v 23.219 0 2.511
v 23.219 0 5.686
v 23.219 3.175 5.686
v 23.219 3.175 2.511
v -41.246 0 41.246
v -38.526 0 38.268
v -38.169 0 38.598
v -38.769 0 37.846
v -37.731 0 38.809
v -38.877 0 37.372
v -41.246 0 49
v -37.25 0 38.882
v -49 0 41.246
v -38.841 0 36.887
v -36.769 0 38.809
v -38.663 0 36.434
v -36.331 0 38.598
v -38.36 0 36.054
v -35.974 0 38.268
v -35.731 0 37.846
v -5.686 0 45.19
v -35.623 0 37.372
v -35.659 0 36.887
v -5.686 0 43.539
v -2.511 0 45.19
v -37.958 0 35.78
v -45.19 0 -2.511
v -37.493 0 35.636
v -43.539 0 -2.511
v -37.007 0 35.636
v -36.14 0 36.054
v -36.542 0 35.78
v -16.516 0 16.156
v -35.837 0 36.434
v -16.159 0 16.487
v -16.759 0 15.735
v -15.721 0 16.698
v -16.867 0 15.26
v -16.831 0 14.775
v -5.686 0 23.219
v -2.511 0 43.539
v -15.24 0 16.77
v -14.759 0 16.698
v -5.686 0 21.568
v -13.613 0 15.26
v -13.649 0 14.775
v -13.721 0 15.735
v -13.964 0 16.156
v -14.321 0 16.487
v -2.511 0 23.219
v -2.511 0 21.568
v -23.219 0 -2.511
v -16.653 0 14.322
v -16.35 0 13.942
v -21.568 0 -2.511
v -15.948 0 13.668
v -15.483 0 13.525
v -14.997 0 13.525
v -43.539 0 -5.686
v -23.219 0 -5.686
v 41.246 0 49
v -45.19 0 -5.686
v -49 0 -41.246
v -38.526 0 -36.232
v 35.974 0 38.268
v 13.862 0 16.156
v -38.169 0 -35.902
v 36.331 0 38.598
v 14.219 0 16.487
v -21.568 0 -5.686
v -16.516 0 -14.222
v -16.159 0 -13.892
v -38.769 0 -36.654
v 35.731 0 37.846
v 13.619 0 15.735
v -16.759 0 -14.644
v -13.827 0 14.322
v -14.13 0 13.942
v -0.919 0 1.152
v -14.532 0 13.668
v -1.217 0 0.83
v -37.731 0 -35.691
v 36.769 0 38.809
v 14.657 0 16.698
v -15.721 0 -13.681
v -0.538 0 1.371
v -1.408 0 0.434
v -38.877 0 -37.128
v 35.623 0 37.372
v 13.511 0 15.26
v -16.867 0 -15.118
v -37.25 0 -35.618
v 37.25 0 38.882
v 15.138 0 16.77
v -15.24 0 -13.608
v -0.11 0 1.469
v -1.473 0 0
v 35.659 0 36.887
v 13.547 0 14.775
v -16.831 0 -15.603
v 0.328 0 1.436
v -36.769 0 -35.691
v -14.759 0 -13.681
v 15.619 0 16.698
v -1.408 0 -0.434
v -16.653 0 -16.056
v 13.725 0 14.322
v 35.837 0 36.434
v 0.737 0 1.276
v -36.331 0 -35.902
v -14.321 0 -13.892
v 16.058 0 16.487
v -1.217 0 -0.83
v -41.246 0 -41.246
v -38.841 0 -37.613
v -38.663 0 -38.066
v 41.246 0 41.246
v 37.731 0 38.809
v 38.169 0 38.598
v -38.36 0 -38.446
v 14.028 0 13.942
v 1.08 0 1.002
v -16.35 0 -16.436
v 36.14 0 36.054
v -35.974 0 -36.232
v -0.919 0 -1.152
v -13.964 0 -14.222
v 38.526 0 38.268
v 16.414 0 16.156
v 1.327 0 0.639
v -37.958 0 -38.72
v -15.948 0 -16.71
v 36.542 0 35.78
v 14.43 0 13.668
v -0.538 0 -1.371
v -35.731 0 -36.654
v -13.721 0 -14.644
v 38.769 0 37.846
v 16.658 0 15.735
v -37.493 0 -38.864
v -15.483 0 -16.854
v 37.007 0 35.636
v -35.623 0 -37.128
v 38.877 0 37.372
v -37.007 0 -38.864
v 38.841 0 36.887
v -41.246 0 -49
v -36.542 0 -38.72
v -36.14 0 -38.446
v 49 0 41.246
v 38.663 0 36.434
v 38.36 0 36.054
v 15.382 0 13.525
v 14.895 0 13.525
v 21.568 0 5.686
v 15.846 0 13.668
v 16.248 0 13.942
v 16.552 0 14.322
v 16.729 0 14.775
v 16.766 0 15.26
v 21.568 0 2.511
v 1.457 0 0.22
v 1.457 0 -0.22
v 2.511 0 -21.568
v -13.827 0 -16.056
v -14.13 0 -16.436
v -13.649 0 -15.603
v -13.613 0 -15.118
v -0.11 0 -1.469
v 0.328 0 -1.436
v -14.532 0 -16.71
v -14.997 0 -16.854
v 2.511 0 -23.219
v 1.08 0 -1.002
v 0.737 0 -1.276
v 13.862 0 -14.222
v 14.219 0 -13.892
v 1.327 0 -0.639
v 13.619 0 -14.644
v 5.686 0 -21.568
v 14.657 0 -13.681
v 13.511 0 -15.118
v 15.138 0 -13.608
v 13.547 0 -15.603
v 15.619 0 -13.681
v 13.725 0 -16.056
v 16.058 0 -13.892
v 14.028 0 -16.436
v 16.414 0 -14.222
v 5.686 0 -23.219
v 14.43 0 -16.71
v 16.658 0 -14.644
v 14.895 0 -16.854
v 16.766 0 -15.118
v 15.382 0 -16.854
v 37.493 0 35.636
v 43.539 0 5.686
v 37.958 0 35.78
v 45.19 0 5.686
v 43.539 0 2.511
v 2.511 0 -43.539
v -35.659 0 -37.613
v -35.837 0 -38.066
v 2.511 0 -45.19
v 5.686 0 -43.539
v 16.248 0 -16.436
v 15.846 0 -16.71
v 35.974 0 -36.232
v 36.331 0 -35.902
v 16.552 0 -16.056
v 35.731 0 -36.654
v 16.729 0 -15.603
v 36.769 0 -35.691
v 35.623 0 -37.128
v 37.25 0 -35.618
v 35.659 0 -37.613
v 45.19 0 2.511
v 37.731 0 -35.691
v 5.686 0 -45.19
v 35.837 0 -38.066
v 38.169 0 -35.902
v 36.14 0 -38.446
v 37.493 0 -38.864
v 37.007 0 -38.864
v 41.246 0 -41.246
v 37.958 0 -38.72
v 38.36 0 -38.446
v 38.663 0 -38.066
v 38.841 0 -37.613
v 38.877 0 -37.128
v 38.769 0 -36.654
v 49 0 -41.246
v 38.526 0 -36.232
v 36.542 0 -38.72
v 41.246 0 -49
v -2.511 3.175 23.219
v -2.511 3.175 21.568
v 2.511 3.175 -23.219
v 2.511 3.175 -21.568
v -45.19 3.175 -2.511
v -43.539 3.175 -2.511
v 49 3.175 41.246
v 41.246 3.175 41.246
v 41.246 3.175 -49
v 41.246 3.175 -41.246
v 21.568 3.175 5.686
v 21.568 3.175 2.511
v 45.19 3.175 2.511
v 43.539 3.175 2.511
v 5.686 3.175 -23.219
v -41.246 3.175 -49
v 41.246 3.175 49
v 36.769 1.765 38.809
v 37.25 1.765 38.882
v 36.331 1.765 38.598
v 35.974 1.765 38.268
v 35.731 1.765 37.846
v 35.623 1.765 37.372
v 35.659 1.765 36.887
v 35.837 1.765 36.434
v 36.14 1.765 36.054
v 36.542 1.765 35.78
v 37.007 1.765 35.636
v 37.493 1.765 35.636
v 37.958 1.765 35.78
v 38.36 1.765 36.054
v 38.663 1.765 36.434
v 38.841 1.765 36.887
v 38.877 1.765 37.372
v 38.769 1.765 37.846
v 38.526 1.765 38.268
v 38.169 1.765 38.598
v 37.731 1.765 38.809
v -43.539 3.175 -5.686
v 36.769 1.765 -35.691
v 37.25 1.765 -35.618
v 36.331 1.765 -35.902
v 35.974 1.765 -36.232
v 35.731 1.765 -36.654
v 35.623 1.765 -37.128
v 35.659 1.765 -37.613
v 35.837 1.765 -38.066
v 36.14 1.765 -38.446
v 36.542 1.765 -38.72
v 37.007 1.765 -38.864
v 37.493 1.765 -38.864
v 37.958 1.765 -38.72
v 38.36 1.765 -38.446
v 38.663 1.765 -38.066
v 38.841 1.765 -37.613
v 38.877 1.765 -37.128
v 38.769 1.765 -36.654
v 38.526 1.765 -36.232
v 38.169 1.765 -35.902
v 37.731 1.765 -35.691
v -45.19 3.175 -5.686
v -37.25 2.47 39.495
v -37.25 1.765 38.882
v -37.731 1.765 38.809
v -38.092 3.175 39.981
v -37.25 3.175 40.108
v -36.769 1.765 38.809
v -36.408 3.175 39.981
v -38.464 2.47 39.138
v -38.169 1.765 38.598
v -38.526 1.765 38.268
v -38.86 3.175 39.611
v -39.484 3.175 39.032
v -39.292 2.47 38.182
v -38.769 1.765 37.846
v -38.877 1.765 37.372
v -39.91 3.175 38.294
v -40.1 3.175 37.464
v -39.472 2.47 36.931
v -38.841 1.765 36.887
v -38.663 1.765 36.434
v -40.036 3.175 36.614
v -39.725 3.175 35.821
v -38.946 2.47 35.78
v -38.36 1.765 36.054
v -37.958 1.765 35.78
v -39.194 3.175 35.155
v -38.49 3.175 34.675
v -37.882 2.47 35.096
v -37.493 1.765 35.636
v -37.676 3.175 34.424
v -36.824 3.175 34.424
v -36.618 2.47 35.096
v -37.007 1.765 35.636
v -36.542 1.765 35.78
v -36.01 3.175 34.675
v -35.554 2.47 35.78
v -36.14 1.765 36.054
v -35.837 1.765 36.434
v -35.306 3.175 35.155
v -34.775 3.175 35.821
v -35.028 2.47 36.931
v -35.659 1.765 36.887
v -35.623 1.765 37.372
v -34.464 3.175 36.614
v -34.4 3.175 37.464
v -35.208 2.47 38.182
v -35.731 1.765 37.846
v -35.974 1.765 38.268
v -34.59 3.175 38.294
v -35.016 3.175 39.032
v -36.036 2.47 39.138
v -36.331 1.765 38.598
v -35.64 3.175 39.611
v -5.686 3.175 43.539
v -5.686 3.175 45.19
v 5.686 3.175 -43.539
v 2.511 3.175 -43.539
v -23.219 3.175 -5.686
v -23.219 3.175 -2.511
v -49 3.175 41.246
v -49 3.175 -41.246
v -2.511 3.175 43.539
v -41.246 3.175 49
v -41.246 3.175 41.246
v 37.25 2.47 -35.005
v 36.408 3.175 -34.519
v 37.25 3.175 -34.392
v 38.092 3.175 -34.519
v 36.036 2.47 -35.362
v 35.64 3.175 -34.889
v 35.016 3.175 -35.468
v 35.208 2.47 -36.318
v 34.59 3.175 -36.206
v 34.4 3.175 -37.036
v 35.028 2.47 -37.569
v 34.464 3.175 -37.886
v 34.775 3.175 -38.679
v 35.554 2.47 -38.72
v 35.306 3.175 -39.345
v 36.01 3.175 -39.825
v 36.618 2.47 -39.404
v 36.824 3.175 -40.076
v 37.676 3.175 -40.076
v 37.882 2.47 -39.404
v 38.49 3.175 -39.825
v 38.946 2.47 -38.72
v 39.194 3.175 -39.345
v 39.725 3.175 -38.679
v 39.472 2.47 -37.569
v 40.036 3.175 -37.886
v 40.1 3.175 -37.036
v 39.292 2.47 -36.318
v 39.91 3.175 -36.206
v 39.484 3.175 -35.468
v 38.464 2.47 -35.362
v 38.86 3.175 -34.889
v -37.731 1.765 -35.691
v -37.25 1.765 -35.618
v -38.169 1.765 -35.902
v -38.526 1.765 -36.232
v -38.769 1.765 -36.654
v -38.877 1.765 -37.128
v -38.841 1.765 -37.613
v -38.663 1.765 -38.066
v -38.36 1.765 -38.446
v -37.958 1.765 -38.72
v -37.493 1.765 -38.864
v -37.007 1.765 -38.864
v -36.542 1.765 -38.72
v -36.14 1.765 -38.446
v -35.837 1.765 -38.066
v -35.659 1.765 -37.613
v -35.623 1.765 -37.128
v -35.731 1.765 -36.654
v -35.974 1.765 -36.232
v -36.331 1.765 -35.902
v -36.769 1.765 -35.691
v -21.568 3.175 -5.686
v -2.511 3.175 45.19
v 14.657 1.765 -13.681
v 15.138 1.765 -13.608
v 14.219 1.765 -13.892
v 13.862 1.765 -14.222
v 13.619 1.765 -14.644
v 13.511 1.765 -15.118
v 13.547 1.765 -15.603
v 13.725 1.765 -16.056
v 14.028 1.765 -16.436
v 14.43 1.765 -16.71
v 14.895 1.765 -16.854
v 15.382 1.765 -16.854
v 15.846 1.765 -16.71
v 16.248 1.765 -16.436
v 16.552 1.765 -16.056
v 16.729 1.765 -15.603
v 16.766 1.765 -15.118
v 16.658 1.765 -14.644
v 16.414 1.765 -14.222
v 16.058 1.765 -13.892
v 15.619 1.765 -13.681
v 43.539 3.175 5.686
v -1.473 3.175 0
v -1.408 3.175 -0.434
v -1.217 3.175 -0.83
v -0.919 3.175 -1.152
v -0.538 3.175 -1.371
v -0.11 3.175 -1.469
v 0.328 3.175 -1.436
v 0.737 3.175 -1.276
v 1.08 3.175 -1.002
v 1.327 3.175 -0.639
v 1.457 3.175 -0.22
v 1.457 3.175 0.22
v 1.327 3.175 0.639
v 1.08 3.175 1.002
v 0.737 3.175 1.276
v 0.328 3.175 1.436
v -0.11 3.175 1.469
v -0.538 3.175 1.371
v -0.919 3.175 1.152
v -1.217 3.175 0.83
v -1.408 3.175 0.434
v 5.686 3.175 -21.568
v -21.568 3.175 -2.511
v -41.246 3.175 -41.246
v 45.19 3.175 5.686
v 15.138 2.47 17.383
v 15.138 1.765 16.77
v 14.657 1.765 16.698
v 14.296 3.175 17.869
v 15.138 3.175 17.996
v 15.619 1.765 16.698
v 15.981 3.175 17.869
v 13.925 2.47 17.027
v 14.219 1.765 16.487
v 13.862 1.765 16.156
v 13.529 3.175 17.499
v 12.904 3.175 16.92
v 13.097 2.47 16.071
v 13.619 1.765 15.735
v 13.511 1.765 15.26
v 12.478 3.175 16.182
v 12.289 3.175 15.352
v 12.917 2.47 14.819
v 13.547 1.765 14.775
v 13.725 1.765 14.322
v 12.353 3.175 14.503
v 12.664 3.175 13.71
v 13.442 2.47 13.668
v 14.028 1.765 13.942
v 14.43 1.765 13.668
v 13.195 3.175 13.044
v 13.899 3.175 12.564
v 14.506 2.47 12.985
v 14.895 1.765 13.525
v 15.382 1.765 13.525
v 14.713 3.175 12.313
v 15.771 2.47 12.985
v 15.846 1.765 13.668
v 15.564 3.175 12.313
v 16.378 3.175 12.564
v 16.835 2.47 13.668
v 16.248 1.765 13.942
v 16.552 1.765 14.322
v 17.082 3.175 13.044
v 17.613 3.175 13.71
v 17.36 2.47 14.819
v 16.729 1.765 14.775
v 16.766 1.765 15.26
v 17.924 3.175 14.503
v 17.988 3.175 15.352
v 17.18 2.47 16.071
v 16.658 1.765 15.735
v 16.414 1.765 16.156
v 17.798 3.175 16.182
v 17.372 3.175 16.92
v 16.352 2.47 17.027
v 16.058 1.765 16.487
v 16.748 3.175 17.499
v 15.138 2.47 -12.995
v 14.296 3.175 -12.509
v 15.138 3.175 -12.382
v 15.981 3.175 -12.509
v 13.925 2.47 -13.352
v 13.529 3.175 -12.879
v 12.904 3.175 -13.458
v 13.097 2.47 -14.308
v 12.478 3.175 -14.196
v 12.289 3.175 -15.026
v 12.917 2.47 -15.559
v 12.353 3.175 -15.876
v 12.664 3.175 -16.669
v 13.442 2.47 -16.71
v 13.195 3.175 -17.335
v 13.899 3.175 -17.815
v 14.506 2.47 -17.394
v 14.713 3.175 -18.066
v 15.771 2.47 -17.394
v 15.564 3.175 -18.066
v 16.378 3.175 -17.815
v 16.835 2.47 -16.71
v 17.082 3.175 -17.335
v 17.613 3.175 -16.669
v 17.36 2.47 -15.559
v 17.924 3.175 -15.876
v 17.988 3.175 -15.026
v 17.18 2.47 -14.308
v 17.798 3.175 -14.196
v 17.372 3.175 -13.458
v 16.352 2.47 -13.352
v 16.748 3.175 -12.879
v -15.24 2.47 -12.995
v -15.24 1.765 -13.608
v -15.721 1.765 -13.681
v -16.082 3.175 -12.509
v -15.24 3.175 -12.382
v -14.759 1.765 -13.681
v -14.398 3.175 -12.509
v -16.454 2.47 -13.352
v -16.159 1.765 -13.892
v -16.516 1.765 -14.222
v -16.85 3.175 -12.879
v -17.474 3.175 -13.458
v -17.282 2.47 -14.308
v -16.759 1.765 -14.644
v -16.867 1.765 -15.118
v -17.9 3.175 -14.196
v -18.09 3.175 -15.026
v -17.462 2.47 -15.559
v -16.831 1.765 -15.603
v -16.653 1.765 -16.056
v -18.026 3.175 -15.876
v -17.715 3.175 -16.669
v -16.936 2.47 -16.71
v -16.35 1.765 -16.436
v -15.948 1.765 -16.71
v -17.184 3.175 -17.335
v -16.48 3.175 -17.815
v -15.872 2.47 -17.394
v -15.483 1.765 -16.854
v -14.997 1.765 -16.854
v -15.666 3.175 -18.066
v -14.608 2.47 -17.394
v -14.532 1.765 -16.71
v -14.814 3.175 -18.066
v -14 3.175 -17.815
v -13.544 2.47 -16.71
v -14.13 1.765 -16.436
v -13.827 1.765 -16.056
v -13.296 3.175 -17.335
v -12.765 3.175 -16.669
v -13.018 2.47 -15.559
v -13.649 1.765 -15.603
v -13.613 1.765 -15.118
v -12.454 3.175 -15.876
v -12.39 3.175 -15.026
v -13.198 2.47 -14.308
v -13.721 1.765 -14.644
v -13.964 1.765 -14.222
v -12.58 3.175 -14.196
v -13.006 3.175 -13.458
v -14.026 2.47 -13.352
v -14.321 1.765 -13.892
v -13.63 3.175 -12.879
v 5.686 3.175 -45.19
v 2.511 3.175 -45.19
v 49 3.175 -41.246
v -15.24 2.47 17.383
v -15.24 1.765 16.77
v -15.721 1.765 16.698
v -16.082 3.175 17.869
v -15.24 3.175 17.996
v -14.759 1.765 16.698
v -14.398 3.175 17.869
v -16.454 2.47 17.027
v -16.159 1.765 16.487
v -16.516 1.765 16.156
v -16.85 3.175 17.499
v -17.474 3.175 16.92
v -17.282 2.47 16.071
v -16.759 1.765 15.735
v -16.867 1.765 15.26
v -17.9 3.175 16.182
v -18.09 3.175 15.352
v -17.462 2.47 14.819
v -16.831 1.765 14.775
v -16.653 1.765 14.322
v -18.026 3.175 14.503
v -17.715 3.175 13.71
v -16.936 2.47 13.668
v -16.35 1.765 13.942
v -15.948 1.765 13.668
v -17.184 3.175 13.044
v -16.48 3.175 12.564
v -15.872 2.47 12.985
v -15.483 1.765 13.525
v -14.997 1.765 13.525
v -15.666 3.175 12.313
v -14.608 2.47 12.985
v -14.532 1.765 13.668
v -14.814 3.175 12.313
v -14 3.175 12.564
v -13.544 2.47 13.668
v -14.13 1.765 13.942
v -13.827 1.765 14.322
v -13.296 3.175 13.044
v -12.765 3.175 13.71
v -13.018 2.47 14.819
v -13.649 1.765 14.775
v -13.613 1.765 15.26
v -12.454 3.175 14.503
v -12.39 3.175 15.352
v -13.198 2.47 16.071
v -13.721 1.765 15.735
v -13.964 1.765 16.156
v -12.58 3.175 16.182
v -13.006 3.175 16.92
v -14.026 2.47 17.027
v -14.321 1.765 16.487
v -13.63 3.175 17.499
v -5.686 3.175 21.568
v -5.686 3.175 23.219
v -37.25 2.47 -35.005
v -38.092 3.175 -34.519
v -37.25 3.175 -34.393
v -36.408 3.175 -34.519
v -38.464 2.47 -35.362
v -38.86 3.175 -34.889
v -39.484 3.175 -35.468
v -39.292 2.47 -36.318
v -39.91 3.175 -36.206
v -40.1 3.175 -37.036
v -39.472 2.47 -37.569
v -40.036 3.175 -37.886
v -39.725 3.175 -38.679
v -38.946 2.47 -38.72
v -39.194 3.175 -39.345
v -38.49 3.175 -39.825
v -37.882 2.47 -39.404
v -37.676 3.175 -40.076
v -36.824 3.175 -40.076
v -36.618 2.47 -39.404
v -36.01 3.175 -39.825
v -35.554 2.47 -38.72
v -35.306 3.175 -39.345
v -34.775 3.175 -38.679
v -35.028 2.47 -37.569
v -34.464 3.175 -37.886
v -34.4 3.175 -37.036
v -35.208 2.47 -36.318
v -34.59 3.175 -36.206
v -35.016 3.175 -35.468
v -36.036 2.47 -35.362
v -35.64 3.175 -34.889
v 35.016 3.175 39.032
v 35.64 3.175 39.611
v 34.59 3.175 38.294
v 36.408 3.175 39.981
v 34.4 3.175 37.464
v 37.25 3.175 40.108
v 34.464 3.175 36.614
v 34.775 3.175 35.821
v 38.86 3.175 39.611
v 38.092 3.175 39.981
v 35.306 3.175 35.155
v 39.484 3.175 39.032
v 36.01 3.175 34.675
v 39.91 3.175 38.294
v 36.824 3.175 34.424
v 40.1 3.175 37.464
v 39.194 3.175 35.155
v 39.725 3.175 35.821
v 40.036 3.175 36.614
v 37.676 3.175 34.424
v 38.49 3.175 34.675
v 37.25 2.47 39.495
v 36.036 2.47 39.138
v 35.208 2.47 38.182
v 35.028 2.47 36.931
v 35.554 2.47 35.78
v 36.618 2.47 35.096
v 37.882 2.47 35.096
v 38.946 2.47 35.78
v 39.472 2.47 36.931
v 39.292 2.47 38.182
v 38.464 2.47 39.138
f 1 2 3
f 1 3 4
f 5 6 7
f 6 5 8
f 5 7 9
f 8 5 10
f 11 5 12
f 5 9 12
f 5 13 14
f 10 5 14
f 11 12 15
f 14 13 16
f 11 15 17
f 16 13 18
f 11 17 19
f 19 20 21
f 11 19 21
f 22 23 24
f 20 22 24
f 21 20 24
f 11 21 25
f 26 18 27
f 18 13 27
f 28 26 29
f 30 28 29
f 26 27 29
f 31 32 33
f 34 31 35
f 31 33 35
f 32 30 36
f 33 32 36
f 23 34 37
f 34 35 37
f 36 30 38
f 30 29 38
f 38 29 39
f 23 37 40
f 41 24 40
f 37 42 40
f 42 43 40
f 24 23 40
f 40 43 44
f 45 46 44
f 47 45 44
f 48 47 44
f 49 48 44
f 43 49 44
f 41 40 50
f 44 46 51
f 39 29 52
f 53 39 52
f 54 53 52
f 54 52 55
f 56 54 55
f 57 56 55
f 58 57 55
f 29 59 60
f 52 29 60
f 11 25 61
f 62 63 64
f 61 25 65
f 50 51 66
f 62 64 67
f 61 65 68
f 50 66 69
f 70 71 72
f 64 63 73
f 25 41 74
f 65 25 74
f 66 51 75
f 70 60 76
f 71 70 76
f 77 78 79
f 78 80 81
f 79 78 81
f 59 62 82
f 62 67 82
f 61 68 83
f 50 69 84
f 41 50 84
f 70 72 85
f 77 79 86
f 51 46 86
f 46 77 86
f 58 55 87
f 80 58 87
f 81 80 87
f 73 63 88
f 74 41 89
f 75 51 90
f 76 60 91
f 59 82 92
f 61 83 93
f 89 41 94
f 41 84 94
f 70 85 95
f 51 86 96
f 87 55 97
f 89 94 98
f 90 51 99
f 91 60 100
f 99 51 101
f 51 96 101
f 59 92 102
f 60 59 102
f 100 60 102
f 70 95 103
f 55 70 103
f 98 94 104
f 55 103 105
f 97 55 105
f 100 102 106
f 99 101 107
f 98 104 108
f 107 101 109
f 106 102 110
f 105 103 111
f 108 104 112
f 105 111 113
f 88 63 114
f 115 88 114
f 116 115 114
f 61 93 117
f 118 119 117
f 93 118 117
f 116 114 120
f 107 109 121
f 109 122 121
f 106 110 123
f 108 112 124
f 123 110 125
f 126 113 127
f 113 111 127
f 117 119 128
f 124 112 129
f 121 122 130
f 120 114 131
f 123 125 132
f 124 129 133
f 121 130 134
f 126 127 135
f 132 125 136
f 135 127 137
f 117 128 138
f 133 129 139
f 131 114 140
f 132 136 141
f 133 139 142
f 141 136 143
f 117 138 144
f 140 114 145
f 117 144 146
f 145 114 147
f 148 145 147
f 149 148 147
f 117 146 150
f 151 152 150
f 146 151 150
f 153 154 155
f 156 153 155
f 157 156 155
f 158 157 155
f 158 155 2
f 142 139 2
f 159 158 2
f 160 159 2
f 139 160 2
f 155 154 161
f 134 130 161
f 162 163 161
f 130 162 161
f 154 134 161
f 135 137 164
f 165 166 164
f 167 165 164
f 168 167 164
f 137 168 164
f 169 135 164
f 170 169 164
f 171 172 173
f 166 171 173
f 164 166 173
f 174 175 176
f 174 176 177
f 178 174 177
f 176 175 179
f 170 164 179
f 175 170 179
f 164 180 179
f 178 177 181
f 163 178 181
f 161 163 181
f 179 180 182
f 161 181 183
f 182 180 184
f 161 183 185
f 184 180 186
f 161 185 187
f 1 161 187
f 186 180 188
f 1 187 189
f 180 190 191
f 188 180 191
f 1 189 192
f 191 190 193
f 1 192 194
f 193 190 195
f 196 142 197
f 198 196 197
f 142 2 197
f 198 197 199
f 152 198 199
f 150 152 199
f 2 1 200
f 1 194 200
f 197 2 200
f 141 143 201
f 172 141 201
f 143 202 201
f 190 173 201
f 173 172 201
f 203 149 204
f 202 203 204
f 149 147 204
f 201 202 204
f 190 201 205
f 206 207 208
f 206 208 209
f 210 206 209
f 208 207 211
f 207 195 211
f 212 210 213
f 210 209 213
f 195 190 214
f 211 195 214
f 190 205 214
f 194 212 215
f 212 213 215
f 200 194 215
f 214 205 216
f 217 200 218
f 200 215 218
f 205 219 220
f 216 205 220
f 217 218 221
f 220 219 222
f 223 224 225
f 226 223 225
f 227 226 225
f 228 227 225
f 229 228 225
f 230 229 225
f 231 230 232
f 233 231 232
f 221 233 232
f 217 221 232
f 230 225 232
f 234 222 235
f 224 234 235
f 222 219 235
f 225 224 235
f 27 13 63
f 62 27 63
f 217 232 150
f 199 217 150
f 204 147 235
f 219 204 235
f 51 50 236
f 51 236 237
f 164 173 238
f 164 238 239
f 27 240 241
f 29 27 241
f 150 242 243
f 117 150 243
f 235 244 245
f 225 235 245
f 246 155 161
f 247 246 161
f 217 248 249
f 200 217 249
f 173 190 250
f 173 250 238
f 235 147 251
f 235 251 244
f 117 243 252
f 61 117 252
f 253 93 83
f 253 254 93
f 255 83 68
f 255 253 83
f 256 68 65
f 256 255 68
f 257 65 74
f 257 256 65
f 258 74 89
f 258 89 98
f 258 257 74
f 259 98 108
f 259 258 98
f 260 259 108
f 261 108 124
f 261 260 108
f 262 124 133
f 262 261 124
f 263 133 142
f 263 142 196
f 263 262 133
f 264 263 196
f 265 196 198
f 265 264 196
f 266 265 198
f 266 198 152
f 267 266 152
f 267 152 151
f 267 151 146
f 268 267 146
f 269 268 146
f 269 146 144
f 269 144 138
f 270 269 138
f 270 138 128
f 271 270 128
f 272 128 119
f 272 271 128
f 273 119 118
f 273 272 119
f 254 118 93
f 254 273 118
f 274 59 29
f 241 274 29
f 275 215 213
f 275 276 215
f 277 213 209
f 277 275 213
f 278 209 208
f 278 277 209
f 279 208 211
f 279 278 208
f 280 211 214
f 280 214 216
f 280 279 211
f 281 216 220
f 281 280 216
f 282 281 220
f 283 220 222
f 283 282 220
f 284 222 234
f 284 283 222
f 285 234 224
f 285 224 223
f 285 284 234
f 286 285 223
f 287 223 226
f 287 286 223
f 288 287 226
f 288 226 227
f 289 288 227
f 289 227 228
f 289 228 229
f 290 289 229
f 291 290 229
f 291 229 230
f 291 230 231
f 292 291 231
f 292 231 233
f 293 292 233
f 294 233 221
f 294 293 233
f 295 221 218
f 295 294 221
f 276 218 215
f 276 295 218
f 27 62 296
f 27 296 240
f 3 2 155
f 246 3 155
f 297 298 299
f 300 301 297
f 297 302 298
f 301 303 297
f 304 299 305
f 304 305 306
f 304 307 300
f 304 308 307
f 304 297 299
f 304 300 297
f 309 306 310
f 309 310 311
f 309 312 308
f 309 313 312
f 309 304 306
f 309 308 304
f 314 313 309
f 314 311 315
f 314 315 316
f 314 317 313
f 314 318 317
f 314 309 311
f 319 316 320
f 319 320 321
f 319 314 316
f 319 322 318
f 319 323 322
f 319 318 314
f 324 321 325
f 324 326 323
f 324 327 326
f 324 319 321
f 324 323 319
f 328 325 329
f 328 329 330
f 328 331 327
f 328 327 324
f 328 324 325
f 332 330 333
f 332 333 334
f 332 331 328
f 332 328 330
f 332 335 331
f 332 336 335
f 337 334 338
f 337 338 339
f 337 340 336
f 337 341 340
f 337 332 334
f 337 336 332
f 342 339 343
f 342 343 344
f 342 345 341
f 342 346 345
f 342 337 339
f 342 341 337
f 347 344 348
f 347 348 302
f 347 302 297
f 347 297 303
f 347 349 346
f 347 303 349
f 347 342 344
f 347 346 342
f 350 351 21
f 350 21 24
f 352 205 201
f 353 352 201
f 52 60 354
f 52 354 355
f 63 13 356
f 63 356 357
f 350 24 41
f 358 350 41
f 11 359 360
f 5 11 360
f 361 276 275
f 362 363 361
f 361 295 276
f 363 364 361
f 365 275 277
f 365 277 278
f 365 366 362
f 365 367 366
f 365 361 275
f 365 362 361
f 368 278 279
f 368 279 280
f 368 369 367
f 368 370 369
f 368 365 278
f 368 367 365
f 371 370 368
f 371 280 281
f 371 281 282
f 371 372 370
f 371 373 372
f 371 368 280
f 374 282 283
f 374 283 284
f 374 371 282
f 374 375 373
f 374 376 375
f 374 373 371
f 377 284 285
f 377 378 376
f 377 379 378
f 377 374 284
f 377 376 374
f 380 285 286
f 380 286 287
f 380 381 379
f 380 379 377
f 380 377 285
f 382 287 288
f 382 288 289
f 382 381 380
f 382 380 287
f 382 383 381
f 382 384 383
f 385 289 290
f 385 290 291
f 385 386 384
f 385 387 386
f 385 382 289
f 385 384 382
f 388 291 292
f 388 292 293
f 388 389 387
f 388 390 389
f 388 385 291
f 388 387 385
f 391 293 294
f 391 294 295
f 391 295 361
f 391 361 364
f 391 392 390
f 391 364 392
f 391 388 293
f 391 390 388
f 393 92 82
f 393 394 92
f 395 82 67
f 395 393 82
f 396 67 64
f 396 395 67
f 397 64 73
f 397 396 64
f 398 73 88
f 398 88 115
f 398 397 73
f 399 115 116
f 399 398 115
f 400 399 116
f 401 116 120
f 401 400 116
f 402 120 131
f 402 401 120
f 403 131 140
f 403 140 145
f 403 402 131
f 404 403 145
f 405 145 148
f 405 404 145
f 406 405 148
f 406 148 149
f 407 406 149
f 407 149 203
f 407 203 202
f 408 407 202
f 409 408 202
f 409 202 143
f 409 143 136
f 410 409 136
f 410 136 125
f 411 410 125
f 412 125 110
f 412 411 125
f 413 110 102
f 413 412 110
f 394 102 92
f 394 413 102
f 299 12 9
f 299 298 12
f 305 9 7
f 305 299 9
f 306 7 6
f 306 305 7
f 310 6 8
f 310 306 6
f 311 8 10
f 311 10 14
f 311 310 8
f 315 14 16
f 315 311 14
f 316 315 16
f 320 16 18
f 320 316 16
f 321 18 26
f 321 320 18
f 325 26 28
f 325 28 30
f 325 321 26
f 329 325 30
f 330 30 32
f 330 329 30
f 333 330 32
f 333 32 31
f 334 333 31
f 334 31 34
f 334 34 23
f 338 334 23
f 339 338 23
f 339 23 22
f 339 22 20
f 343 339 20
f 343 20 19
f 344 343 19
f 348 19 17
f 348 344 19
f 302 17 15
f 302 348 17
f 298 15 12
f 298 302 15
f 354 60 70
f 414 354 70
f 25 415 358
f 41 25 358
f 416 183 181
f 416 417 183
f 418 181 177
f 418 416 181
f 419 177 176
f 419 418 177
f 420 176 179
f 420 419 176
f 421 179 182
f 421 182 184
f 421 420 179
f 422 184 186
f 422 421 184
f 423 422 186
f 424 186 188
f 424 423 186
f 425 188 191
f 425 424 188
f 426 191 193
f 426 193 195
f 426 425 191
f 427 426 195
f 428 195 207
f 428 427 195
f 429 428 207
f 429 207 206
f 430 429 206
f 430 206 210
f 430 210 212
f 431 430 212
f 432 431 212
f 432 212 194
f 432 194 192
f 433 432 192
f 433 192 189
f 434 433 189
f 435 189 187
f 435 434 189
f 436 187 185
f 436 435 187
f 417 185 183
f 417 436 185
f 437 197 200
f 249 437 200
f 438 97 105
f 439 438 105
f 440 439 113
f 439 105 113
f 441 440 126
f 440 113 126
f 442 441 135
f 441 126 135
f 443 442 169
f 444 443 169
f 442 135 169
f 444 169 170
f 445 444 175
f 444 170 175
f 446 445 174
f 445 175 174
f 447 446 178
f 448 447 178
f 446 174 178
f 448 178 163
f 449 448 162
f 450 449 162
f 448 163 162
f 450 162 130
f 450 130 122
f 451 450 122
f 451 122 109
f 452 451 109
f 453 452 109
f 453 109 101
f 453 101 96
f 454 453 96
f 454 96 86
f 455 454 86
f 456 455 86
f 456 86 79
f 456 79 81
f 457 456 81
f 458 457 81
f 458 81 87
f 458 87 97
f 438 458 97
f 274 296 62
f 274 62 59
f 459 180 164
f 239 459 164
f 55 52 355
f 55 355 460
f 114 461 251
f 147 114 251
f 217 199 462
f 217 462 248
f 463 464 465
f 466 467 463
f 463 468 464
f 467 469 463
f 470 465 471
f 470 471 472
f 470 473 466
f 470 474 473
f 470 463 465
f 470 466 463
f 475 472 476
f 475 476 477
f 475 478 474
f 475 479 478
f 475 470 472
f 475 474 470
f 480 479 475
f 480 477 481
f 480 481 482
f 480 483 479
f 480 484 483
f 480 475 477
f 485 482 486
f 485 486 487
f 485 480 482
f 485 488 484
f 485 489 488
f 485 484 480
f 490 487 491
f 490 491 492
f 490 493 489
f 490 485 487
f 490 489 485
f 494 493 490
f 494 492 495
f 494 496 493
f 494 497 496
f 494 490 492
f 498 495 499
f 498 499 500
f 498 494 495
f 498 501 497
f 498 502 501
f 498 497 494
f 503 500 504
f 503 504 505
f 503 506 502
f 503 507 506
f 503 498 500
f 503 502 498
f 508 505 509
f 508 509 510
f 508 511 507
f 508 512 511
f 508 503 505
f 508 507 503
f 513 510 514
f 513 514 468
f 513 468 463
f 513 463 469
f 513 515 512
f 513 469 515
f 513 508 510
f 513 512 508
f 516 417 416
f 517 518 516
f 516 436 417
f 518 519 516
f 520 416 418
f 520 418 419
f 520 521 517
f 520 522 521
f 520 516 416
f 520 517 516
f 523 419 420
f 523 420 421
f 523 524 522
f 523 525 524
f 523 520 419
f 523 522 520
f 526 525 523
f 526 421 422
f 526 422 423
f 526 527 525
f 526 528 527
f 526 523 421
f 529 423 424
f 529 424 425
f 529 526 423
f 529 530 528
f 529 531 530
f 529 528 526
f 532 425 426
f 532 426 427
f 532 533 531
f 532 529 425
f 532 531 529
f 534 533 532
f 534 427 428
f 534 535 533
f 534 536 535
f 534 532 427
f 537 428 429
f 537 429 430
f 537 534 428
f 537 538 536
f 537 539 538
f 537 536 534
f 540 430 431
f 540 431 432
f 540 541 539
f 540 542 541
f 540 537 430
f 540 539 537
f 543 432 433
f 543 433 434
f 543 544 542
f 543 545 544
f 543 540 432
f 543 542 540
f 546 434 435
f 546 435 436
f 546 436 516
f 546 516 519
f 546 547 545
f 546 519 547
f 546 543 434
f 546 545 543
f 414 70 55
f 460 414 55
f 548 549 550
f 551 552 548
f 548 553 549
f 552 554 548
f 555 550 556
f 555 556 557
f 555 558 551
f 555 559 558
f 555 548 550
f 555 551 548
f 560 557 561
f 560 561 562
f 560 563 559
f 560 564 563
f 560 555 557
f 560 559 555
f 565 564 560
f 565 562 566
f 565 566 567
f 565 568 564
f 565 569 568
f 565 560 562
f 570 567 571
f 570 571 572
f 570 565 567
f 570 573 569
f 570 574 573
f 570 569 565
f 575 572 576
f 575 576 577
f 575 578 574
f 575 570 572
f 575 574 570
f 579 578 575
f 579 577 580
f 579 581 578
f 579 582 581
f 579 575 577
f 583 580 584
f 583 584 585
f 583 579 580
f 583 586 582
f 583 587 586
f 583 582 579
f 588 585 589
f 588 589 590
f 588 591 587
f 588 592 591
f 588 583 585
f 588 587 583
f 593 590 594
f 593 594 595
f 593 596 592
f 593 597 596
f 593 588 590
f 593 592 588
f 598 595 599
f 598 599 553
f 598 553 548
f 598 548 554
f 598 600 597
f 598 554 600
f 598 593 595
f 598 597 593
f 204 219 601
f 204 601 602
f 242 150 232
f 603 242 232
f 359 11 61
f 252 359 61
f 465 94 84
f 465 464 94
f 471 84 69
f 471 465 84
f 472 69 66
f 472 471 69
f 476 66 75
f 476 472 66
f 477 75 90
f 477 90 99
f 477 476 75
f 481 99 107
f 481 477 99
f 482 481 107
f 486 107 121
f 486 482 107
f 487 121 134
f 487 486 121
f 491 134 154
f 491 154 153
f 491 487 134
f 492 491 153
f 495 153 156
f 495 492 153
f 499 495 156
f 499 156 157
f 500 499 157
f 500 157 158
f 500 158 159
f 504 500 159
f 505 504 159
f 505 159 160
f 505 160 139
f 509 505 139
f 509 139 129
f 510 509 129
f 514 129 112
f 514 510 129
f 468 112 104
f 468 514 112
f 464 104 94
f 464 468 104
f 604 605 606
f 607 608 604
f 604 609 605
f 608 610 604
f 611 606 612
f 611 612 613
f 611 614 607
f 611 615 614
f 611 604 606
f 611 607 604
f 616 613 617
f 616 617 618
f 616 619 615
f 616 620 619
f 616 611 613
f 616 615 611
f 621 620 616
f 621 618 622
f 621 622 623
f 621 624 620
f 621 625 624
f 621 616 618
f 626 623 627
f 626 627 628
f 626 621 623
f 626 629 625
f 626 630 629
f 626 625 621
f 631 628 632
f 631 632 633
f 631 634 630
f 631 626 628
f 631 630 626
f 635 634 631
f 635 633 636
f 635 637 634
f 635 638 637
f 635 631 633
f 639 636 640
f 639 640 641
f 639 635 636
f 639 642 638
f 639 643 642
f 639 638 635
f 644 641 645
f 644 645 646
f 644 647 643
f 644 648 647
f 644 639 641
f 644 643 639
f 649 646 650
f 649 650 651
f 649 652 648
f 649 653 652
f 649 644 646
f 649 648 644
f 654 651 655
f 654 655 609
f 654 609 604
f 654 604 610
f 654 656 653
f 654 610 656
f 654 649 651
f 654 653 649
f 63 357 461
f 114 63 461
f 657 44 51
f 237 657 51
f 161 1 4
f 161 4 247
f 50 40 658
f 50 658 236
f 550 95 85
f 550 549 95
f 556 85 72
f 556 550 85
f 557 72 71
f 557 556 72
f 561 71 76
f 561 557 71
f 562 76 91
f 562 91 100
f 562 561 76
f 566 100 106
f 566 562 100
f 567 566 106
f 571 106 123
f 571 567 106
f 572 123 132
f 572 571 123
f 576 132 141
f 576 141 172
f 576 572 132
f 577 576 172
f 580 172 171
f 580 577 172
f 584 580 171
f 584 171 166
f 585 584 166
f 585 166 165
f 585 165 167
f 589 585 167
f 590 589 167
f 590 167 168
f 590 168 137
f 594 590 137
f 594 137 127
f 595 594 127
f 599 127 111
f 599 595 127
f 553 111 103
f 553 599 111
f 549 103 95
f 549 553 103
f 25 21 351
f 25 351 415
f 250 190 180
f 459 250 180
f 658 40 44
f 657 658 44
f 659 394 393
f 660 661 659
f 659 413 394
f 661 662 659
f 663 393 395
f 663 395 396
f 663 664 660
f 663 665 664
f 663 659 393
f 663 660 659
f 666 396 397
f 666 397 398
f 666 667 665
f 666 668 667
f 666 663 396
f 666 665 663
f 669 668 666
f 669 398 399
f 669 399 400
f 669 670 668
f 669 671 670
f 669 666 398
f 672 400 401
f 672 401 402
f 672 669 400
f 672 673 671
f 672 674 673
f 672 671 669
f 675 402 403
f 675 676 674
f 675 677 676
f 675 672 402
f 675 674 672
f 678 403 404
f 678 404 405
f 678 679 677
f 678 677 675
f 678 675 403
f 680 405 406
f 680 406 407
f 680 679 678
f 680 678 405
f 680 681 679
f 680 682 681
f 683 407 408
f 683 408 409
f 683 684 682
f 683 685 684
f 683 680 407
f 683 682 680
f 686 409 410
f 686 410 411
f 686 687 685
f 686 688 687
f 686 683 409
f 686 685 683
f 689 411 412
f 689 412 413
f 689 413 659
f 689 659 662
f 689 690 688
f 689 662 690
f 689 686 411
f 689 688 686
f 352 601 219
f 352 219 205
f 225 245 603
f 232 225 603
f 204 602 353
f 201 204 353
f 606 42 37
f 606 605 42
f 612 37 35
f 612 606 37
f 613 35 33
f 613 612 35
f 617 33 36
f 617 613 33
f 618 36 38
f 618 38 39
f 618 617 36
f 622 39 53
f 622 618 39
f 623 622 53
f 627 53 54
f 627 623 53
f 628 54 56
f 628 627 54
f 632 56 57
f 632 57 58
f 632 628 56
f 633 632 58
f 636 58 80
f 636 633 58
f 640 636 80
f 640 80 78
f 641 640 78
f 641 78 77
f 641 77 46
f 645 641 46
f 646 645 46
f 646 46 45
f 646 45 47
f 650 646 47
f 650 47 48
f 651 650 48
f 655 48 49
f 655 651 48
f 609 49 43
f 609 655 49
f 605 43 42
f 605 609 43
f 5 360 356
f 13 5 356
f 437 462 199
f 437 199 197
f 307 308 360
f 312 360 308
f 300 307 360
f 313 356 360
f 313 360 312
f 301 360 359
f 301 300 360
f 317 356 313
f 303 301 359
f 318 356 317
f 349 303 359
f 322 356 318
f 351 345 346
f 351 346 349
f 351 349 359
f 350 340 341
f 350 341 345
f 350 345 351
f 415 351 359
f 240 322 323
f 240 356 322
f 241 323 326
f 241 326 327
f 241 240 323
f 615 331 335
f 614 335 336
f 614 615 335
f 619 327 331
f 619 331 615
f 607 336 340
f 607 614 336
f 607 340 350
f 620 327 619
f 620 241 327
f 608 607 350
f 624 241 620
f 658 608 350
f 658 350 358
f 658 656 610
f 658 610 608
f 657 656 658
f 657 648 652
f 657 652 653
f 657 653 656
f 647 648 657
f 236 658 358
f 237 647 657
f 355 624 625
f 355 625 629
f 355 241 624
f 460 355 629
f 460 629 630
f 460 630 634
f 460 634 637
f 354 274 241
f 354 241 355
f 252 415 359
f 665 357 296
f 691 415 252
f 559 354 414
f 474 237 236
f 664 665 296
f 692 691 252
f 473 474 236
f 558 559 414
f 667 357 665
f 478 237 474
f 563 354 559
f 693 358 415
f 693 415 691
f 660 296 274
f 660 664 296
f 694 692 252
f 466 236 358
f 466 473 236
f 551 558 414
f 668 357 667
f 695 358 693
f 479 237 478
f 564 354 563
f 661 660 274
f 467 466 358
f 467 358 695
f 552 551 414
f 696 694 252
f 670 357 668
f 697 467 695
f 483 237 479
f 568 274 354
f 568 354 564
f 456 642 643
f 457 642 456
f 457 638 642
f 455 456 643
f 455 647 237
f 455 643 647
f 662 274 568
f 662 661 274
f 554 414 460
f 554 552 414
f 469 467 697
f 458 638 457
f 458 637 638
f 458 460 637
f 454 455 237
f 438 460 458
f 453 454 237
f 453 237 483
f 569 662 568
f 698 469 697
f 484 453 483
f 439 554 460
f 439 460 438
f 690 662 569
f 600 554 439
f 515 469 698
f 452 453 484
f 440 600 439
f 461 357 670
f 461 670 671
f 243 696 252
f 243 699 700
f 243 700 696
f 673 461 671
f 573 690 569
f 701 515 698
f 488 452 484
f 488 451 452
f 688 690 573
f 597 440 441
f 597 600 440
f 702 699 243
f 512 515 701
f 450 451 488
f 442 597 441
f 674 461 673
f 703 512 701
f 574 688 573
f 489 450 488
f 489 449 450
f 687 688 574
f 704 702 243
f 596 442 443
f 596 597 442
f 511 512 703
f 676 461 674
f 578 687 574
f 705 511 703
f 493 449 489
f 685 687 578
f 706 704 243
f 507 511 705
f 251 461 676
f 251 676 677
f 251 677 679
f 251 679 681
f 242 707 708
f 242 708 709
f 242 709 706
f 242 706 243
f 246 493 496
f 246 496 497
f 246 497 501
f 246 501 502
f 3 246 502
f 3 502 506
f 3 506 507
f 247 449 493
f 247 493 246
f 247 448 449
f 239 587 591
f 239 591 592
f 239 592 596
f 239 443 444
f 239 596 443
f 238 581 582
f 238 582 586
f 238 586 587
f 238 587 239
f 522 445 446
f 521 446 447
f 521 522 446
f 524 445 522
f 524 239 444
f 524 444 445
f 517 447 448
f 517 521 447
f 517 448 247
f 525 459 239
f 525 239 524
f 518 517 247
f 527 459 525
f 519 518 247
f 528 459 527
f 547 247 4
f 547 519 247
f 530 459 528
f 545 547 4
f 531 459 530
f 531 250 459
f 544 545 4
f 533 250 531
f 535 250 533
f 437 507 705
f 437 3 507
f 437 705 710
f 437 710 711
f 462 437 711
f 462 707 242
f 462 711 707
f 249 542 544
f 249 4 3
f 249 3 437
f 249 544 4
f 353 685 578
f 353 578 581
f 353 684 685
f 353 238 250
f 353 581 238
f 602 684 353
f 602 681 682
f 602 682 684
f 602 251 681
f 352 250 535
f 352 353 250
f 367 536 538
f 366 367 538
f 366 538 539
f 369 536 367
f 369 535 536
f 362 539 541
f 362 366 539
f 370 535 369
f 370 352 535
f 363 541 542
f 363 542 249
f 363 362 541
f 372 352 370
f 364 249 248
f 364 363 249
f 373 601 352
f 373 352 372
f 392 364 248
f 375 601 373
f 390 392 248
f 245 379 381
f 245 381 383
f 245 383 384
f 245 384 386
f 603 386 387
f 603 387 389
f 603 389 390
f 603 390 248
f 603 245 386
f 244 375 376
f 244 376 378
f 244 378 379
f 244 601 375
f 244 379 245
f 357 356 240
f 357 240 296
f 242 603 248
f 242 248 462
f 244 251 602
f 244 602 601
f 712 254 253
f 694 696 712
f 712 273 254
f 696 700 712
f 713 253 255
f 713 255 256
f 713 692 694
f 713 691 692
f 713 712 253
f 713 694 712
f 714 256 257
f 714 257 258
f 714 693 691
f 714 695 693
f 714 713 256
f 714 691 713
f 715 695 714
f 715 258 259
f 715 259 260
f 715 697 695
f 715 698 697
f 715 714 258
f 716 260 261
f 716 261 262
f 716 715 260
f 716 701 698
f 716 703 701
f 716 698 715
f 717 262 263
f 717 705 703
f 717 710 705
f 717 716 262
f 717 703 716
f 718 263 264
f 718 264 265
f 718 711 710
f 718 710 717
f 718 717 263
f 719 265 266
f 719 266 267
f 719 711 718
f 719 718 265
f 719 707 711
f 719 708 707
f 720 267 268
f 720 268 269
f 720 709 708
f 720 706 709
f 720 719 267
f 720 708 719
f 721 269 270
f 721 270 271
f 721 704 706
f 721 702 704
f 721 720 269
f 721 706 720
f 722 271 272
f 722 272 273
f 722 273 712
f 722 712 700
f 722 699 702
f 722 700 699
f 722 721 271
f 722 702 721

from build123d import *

# Parameters (mm, degrees)
SKETCH1_W                                     = 98
SKETCH1_H                                     = 98
BOSS_EXTRUDE1_DEPTH                           = 3.175
SKETCH2_W                                     = 7.5
SKETCH2_H                                     = 7.5
CUT_EXTRUDE1_DEPTH                            = 70.369161917
F_4_CLEARANCE_HOLE1_D                         = 2.9464
CSK_FOR_4_FLAT_HEAD_MACHINE_SCREW1_AT_2_COUNT = 2
CSK_FOR_4_FLAT_HEAD_MACHINE_SCREW1_AT_2_PITCH = 74.5
CSK_FOR_4_FLAT_HEAD_MACHINE_SCREW1_AT_3_COUNT = 2
CSK_FOR_4_FLAT_HEAD_MACHINE_SCREW1_AT_3_PITCH = 105.358910397
CSK_FOR_4_FLAT_HEAD_MACHINE_SCREW1_AT_4_COUNT = 2
CSK_FOR_4_FLAT_HEAD_MACHINE_SCREW1_AT_4_PITCH = 74.5
CSK_FOR_4_FLAT_HEAD_MACHINE_SCREW2_AT_2_COUNT = 2
CSK_FOR_4_FLAT_HEAD_MACHINE_SCREW2_AT_2_PITCH = 30.3784
CSK_FOR_4_FLAT_HEAD_MACHINE_SCREW2_AT_3_COUNT = 2
CSK_FOR_4_FLAT_HEAD_MACHINE_SCREW2_AT_3_PITCH = 42.961545283
CSK_FOR_4_FLAT_HEAD_MACHINE_SCREW2_AT_4_COUNT = 2
CSK_FOR_4_FLAT_HEAD_MACHINE_SCREW2_AT_4_PITCH = 30.3784
CUT_EXTRUDE2_DEPTH                            = 70.369161917
SKETCH16_W                                    = 1.651
SKETCH16_H                                    = 3.175
CUT_EXTRUDE3_DEPTH                            = 70.369161917
CIRPATTERN1_COUNT                             = 4


with BuildPart() as part:
    # Sketch1 → Boss-Extrude1 (new body)
    with BuildSketch(Plane(origin=(0, 0, 0), x_dir=(1, 0, 0), z_dir=(0, 1, 0))):
        Rectangle(SKETCH1_W, SKETCH1_H)
    extrude(amount=BOSS_EXTRUDE1_DEPTH)

    # Sketch2 → Cut-Extrude1 (cut, through all)
    with BuildSketch(Plane(origin=(0, 3.175, 0), x_dir=(1, 0, 0), z_dir=(0, 1, 0))):
        with Locations((45.25, 45.25)):
            Rectangle(SKETCH2_W, SKETCH2_H)
        with Locations((-45.25, 45.25)):
            Rectangle(SKETCH2_W, SKETCH2_H)
        with Locations((45.25, -45.25)):
            Rectangle(SKETCH2_W, SKETCH2_H)
        with Locations((-45.25, -45.25)):
            Rectangle(SKETCH2_W, SKETCH2_H)
    extrude(amount=-CUT_EXTRUDE1_DEPTH, mode=Mode.SUBTRACT)

    # #4 Clearance Hole1 (through all)
    with Locations(Plane(origin=(0, 3.175, 0), x_dir=(1, 0, 0), z_dir=(0, 1, 0))):
        with Locations((0, 0)):
            Hole(F_4_CLEARANCE_HOLE1_D / 2)

    # Sketch9 → CSK for #4 Flat Head Machine Screw1 (revolve, cut)
    with BuildSketch(Plane(origin=(37.25, 3.175, 37.25), x_dir=(0, 0, 1), z_dir=(1, 0, 0))):
        Polygon((0, 0), (0, 3.175), (1.63195, 3.175), (1.63195, 1.409834001), (2.8575, 0), align=None)
    csk_for_4_flat_head_machine_screw1 = revolve(axis=Axis((37.25, 9.525, 37.25), (0, -1, 0)), mode=Mode.SUBTRACT)

    # CSK for #4 Flat Head Machine Screw1 at 2: CSK for #4 Flat Head Machine Screw1 ×2
    with Locations(*[(-i * CSK_FOR_4_FLAT_HEAD_MACHINE_SCREW1_AT_2_PITCH, 0, 0) for i in range(1, CSK_FOR_4_FLAT_HEAD_MACHINE_SCREW1_AT_2_COUNT)]):
        add(csk_for_4_flat_head_machine_screw1, mode=Mode.SUBTRACT)

    # CSK for #4 Flat Head Machine Screw1 at 3: CSK for #4 Flat Head Machine Screw1 ×2
    with Locations(*[Vector(-0.7071067811865502, 0, -0.7071067811865448) * (i * CSK_FOR_4_FLAT_HEAD_MACHINE_SCREW1_AT_3_PITCH) for i in range(1, CSK_FOR_4_FLAT_HEAD_MACHINE_SCREW1_AT_3_COUNT)]):
        add(csk_for_4_flat_head_machine_screw1, mode=Mode.SUBTRACT)

    # CSK for #4 Flat Head Machine Screw1 at 4: CSK for #4 Flat Head Machine Screw1 ×2
    with Locations(*[(0, 0, -i * CSK_FOR_4_FLAT_HEAD_MACHINE_SCREW1_AT_4_PITCH) for i in range(1, CSK_FOR_4_FLAT_HEAD_MACHINE_SCREW1_AT_4_COUNT)]):
        add(csk_for_4_flat_head_machine_screw1, mode=Mode.SUBTRACT)

    # Sketch13 → CSK for #4 Flat Head Machine Screw2 (revolve, cut)
    with BuildSketch(Plane(origin=(15.1384, 3.175, -15.24), x_dir=(0, 0, 1), z_dir=(1, 0, 0))):
        Polygon((0, 0), (0, 3.175), (1.63195, 3.175), (1.63195, 1.409834001), (2.8575, 0), align=None)
    csk_for_4_flat_head_machine_screw2 = revolve(axis=Axis((15.1384, 9.525, -15.24), (0, -1, 0)), mode=Mode.SUBTRACT)

    # CSK for #4 Flat Head Machine Screw2 at 2: CSK for #4 Flat Head Machine Screw2 ×2
    with Locations(*[(-i * CSK_FOR_4_FLAT_HEAD_MACHINE_SCREW2_AT_2_PITCH, 0, 0) for i in range(1, CSK_FOR_4_FLAT_HEAD_MACHINE_SCREW2_AT_2_COUNT)]):
        add(csk_for_4_flat_head_machine_screw2, mode=Mode.SUBTRACT)

    # CSK for #4 Flat Head Machine Screw2 at 3: CSK for #4 Flat Head Machine Screw2 ×2
    with Locations(*[Vector(-0.7071067811865475, 0, 0.7071067811865477) * (i * CSK_FOR_4_FLAT_HEAD_MACHINE_SCREW2_AT_3_PITCH) for i in range(1, CSK_FOR_4_FLAT_HEAD_MACHINE_SCREW2_AT_3_COUNT)]):
        add(csk_for_4_flat_head_machine_screw2, mode=Mode.SUBTRACT)

    # CSK for #4 Flat Head Machine Screw2 at 4: CSK for #4 Flat Head Machine Screw2 ×2
    with Locations(*[(0, 0, i * CSK_FOR_4_FLAT_HEAD_MACHINE_SCREW2_AT_4_PITCH) for i in range(1, CSK_FOR_4_FLAT_HEAD_MACHINE_SCREW2_AT_4_COUNT)]):
        add(csk_for_4_flat_head_machine_screw2, mode=Mode.SUBTRACT)

    # Sketch15 → Cut-Extrude2 (cut, through all)
    with BuildSketch(Plane(origin=(0, 3.175, 0), x_dir=(1, 0, 0), z_dir=(0, 1, 0))):
        Polygon((-48.746, -41.246), (-41.246, -41.246), (-41.246, -48.746), (-41.246, -49), (-41.5, -49), (-41.5, -41.5), (-49, -41.5), (-49, -41.246), align=None)
        Polygon((49, 41.246), (49, 41.5), (41.5, 41.5), (41.5, 49), (41.246, 49), (41.246, 48.746), (41.246, 41.246), (48.746, 41.246), align=None)
        Polygon((41.246, -48.746), (41.246, -41.246), (48.746, -41.246), (49, -41.246), (49, -41.5), (41.5, -41.5), (41.5, -49), (41.246, -49), align=None)
        Polygon((-41.246, 48.746), (-41.246, 41.246), (-48.746, 41.246), (-49, 41.246), (-49, 41.5), (-41.5, 41.5), (-41.5, 49), (-41.246, 49), align=None)
    extrude(amount=-CUT_EXTRUDE2_DEPTH, mode=Mode.SUBTRACT)

    # Sketch16 → Cut-Extrude3 (cut, through all)
    with BuildSketch(Plane.XZ):
        with Locations((-44.3645, -4.0985)):
            Rectangle(SKETCH16_W, SKETCH16_H)
        with Locations((-22.3935, -4.0985)):
            Rectangle(SKETCH16_W, SKETCH16_H)
    cut_extrude3 = extrude(amount=-CUT_EXTRUDE3_DEPTH, mode=Mode.SUBTRACT)

    # CirPattern1: Cut-Extrude3 ×4 about axis
    cirpattern1_axis = Axis((0, 0, 0), (0, 1, 0))
    for i in range(1, CIRPATTERN1_COUNT):
        add(cut_extrude3.rotate(cirpattern1_axis, i * 360 / CIRPATTERN1_COUNT), mode=Mode.SUBTRACT)


solid = part.part
